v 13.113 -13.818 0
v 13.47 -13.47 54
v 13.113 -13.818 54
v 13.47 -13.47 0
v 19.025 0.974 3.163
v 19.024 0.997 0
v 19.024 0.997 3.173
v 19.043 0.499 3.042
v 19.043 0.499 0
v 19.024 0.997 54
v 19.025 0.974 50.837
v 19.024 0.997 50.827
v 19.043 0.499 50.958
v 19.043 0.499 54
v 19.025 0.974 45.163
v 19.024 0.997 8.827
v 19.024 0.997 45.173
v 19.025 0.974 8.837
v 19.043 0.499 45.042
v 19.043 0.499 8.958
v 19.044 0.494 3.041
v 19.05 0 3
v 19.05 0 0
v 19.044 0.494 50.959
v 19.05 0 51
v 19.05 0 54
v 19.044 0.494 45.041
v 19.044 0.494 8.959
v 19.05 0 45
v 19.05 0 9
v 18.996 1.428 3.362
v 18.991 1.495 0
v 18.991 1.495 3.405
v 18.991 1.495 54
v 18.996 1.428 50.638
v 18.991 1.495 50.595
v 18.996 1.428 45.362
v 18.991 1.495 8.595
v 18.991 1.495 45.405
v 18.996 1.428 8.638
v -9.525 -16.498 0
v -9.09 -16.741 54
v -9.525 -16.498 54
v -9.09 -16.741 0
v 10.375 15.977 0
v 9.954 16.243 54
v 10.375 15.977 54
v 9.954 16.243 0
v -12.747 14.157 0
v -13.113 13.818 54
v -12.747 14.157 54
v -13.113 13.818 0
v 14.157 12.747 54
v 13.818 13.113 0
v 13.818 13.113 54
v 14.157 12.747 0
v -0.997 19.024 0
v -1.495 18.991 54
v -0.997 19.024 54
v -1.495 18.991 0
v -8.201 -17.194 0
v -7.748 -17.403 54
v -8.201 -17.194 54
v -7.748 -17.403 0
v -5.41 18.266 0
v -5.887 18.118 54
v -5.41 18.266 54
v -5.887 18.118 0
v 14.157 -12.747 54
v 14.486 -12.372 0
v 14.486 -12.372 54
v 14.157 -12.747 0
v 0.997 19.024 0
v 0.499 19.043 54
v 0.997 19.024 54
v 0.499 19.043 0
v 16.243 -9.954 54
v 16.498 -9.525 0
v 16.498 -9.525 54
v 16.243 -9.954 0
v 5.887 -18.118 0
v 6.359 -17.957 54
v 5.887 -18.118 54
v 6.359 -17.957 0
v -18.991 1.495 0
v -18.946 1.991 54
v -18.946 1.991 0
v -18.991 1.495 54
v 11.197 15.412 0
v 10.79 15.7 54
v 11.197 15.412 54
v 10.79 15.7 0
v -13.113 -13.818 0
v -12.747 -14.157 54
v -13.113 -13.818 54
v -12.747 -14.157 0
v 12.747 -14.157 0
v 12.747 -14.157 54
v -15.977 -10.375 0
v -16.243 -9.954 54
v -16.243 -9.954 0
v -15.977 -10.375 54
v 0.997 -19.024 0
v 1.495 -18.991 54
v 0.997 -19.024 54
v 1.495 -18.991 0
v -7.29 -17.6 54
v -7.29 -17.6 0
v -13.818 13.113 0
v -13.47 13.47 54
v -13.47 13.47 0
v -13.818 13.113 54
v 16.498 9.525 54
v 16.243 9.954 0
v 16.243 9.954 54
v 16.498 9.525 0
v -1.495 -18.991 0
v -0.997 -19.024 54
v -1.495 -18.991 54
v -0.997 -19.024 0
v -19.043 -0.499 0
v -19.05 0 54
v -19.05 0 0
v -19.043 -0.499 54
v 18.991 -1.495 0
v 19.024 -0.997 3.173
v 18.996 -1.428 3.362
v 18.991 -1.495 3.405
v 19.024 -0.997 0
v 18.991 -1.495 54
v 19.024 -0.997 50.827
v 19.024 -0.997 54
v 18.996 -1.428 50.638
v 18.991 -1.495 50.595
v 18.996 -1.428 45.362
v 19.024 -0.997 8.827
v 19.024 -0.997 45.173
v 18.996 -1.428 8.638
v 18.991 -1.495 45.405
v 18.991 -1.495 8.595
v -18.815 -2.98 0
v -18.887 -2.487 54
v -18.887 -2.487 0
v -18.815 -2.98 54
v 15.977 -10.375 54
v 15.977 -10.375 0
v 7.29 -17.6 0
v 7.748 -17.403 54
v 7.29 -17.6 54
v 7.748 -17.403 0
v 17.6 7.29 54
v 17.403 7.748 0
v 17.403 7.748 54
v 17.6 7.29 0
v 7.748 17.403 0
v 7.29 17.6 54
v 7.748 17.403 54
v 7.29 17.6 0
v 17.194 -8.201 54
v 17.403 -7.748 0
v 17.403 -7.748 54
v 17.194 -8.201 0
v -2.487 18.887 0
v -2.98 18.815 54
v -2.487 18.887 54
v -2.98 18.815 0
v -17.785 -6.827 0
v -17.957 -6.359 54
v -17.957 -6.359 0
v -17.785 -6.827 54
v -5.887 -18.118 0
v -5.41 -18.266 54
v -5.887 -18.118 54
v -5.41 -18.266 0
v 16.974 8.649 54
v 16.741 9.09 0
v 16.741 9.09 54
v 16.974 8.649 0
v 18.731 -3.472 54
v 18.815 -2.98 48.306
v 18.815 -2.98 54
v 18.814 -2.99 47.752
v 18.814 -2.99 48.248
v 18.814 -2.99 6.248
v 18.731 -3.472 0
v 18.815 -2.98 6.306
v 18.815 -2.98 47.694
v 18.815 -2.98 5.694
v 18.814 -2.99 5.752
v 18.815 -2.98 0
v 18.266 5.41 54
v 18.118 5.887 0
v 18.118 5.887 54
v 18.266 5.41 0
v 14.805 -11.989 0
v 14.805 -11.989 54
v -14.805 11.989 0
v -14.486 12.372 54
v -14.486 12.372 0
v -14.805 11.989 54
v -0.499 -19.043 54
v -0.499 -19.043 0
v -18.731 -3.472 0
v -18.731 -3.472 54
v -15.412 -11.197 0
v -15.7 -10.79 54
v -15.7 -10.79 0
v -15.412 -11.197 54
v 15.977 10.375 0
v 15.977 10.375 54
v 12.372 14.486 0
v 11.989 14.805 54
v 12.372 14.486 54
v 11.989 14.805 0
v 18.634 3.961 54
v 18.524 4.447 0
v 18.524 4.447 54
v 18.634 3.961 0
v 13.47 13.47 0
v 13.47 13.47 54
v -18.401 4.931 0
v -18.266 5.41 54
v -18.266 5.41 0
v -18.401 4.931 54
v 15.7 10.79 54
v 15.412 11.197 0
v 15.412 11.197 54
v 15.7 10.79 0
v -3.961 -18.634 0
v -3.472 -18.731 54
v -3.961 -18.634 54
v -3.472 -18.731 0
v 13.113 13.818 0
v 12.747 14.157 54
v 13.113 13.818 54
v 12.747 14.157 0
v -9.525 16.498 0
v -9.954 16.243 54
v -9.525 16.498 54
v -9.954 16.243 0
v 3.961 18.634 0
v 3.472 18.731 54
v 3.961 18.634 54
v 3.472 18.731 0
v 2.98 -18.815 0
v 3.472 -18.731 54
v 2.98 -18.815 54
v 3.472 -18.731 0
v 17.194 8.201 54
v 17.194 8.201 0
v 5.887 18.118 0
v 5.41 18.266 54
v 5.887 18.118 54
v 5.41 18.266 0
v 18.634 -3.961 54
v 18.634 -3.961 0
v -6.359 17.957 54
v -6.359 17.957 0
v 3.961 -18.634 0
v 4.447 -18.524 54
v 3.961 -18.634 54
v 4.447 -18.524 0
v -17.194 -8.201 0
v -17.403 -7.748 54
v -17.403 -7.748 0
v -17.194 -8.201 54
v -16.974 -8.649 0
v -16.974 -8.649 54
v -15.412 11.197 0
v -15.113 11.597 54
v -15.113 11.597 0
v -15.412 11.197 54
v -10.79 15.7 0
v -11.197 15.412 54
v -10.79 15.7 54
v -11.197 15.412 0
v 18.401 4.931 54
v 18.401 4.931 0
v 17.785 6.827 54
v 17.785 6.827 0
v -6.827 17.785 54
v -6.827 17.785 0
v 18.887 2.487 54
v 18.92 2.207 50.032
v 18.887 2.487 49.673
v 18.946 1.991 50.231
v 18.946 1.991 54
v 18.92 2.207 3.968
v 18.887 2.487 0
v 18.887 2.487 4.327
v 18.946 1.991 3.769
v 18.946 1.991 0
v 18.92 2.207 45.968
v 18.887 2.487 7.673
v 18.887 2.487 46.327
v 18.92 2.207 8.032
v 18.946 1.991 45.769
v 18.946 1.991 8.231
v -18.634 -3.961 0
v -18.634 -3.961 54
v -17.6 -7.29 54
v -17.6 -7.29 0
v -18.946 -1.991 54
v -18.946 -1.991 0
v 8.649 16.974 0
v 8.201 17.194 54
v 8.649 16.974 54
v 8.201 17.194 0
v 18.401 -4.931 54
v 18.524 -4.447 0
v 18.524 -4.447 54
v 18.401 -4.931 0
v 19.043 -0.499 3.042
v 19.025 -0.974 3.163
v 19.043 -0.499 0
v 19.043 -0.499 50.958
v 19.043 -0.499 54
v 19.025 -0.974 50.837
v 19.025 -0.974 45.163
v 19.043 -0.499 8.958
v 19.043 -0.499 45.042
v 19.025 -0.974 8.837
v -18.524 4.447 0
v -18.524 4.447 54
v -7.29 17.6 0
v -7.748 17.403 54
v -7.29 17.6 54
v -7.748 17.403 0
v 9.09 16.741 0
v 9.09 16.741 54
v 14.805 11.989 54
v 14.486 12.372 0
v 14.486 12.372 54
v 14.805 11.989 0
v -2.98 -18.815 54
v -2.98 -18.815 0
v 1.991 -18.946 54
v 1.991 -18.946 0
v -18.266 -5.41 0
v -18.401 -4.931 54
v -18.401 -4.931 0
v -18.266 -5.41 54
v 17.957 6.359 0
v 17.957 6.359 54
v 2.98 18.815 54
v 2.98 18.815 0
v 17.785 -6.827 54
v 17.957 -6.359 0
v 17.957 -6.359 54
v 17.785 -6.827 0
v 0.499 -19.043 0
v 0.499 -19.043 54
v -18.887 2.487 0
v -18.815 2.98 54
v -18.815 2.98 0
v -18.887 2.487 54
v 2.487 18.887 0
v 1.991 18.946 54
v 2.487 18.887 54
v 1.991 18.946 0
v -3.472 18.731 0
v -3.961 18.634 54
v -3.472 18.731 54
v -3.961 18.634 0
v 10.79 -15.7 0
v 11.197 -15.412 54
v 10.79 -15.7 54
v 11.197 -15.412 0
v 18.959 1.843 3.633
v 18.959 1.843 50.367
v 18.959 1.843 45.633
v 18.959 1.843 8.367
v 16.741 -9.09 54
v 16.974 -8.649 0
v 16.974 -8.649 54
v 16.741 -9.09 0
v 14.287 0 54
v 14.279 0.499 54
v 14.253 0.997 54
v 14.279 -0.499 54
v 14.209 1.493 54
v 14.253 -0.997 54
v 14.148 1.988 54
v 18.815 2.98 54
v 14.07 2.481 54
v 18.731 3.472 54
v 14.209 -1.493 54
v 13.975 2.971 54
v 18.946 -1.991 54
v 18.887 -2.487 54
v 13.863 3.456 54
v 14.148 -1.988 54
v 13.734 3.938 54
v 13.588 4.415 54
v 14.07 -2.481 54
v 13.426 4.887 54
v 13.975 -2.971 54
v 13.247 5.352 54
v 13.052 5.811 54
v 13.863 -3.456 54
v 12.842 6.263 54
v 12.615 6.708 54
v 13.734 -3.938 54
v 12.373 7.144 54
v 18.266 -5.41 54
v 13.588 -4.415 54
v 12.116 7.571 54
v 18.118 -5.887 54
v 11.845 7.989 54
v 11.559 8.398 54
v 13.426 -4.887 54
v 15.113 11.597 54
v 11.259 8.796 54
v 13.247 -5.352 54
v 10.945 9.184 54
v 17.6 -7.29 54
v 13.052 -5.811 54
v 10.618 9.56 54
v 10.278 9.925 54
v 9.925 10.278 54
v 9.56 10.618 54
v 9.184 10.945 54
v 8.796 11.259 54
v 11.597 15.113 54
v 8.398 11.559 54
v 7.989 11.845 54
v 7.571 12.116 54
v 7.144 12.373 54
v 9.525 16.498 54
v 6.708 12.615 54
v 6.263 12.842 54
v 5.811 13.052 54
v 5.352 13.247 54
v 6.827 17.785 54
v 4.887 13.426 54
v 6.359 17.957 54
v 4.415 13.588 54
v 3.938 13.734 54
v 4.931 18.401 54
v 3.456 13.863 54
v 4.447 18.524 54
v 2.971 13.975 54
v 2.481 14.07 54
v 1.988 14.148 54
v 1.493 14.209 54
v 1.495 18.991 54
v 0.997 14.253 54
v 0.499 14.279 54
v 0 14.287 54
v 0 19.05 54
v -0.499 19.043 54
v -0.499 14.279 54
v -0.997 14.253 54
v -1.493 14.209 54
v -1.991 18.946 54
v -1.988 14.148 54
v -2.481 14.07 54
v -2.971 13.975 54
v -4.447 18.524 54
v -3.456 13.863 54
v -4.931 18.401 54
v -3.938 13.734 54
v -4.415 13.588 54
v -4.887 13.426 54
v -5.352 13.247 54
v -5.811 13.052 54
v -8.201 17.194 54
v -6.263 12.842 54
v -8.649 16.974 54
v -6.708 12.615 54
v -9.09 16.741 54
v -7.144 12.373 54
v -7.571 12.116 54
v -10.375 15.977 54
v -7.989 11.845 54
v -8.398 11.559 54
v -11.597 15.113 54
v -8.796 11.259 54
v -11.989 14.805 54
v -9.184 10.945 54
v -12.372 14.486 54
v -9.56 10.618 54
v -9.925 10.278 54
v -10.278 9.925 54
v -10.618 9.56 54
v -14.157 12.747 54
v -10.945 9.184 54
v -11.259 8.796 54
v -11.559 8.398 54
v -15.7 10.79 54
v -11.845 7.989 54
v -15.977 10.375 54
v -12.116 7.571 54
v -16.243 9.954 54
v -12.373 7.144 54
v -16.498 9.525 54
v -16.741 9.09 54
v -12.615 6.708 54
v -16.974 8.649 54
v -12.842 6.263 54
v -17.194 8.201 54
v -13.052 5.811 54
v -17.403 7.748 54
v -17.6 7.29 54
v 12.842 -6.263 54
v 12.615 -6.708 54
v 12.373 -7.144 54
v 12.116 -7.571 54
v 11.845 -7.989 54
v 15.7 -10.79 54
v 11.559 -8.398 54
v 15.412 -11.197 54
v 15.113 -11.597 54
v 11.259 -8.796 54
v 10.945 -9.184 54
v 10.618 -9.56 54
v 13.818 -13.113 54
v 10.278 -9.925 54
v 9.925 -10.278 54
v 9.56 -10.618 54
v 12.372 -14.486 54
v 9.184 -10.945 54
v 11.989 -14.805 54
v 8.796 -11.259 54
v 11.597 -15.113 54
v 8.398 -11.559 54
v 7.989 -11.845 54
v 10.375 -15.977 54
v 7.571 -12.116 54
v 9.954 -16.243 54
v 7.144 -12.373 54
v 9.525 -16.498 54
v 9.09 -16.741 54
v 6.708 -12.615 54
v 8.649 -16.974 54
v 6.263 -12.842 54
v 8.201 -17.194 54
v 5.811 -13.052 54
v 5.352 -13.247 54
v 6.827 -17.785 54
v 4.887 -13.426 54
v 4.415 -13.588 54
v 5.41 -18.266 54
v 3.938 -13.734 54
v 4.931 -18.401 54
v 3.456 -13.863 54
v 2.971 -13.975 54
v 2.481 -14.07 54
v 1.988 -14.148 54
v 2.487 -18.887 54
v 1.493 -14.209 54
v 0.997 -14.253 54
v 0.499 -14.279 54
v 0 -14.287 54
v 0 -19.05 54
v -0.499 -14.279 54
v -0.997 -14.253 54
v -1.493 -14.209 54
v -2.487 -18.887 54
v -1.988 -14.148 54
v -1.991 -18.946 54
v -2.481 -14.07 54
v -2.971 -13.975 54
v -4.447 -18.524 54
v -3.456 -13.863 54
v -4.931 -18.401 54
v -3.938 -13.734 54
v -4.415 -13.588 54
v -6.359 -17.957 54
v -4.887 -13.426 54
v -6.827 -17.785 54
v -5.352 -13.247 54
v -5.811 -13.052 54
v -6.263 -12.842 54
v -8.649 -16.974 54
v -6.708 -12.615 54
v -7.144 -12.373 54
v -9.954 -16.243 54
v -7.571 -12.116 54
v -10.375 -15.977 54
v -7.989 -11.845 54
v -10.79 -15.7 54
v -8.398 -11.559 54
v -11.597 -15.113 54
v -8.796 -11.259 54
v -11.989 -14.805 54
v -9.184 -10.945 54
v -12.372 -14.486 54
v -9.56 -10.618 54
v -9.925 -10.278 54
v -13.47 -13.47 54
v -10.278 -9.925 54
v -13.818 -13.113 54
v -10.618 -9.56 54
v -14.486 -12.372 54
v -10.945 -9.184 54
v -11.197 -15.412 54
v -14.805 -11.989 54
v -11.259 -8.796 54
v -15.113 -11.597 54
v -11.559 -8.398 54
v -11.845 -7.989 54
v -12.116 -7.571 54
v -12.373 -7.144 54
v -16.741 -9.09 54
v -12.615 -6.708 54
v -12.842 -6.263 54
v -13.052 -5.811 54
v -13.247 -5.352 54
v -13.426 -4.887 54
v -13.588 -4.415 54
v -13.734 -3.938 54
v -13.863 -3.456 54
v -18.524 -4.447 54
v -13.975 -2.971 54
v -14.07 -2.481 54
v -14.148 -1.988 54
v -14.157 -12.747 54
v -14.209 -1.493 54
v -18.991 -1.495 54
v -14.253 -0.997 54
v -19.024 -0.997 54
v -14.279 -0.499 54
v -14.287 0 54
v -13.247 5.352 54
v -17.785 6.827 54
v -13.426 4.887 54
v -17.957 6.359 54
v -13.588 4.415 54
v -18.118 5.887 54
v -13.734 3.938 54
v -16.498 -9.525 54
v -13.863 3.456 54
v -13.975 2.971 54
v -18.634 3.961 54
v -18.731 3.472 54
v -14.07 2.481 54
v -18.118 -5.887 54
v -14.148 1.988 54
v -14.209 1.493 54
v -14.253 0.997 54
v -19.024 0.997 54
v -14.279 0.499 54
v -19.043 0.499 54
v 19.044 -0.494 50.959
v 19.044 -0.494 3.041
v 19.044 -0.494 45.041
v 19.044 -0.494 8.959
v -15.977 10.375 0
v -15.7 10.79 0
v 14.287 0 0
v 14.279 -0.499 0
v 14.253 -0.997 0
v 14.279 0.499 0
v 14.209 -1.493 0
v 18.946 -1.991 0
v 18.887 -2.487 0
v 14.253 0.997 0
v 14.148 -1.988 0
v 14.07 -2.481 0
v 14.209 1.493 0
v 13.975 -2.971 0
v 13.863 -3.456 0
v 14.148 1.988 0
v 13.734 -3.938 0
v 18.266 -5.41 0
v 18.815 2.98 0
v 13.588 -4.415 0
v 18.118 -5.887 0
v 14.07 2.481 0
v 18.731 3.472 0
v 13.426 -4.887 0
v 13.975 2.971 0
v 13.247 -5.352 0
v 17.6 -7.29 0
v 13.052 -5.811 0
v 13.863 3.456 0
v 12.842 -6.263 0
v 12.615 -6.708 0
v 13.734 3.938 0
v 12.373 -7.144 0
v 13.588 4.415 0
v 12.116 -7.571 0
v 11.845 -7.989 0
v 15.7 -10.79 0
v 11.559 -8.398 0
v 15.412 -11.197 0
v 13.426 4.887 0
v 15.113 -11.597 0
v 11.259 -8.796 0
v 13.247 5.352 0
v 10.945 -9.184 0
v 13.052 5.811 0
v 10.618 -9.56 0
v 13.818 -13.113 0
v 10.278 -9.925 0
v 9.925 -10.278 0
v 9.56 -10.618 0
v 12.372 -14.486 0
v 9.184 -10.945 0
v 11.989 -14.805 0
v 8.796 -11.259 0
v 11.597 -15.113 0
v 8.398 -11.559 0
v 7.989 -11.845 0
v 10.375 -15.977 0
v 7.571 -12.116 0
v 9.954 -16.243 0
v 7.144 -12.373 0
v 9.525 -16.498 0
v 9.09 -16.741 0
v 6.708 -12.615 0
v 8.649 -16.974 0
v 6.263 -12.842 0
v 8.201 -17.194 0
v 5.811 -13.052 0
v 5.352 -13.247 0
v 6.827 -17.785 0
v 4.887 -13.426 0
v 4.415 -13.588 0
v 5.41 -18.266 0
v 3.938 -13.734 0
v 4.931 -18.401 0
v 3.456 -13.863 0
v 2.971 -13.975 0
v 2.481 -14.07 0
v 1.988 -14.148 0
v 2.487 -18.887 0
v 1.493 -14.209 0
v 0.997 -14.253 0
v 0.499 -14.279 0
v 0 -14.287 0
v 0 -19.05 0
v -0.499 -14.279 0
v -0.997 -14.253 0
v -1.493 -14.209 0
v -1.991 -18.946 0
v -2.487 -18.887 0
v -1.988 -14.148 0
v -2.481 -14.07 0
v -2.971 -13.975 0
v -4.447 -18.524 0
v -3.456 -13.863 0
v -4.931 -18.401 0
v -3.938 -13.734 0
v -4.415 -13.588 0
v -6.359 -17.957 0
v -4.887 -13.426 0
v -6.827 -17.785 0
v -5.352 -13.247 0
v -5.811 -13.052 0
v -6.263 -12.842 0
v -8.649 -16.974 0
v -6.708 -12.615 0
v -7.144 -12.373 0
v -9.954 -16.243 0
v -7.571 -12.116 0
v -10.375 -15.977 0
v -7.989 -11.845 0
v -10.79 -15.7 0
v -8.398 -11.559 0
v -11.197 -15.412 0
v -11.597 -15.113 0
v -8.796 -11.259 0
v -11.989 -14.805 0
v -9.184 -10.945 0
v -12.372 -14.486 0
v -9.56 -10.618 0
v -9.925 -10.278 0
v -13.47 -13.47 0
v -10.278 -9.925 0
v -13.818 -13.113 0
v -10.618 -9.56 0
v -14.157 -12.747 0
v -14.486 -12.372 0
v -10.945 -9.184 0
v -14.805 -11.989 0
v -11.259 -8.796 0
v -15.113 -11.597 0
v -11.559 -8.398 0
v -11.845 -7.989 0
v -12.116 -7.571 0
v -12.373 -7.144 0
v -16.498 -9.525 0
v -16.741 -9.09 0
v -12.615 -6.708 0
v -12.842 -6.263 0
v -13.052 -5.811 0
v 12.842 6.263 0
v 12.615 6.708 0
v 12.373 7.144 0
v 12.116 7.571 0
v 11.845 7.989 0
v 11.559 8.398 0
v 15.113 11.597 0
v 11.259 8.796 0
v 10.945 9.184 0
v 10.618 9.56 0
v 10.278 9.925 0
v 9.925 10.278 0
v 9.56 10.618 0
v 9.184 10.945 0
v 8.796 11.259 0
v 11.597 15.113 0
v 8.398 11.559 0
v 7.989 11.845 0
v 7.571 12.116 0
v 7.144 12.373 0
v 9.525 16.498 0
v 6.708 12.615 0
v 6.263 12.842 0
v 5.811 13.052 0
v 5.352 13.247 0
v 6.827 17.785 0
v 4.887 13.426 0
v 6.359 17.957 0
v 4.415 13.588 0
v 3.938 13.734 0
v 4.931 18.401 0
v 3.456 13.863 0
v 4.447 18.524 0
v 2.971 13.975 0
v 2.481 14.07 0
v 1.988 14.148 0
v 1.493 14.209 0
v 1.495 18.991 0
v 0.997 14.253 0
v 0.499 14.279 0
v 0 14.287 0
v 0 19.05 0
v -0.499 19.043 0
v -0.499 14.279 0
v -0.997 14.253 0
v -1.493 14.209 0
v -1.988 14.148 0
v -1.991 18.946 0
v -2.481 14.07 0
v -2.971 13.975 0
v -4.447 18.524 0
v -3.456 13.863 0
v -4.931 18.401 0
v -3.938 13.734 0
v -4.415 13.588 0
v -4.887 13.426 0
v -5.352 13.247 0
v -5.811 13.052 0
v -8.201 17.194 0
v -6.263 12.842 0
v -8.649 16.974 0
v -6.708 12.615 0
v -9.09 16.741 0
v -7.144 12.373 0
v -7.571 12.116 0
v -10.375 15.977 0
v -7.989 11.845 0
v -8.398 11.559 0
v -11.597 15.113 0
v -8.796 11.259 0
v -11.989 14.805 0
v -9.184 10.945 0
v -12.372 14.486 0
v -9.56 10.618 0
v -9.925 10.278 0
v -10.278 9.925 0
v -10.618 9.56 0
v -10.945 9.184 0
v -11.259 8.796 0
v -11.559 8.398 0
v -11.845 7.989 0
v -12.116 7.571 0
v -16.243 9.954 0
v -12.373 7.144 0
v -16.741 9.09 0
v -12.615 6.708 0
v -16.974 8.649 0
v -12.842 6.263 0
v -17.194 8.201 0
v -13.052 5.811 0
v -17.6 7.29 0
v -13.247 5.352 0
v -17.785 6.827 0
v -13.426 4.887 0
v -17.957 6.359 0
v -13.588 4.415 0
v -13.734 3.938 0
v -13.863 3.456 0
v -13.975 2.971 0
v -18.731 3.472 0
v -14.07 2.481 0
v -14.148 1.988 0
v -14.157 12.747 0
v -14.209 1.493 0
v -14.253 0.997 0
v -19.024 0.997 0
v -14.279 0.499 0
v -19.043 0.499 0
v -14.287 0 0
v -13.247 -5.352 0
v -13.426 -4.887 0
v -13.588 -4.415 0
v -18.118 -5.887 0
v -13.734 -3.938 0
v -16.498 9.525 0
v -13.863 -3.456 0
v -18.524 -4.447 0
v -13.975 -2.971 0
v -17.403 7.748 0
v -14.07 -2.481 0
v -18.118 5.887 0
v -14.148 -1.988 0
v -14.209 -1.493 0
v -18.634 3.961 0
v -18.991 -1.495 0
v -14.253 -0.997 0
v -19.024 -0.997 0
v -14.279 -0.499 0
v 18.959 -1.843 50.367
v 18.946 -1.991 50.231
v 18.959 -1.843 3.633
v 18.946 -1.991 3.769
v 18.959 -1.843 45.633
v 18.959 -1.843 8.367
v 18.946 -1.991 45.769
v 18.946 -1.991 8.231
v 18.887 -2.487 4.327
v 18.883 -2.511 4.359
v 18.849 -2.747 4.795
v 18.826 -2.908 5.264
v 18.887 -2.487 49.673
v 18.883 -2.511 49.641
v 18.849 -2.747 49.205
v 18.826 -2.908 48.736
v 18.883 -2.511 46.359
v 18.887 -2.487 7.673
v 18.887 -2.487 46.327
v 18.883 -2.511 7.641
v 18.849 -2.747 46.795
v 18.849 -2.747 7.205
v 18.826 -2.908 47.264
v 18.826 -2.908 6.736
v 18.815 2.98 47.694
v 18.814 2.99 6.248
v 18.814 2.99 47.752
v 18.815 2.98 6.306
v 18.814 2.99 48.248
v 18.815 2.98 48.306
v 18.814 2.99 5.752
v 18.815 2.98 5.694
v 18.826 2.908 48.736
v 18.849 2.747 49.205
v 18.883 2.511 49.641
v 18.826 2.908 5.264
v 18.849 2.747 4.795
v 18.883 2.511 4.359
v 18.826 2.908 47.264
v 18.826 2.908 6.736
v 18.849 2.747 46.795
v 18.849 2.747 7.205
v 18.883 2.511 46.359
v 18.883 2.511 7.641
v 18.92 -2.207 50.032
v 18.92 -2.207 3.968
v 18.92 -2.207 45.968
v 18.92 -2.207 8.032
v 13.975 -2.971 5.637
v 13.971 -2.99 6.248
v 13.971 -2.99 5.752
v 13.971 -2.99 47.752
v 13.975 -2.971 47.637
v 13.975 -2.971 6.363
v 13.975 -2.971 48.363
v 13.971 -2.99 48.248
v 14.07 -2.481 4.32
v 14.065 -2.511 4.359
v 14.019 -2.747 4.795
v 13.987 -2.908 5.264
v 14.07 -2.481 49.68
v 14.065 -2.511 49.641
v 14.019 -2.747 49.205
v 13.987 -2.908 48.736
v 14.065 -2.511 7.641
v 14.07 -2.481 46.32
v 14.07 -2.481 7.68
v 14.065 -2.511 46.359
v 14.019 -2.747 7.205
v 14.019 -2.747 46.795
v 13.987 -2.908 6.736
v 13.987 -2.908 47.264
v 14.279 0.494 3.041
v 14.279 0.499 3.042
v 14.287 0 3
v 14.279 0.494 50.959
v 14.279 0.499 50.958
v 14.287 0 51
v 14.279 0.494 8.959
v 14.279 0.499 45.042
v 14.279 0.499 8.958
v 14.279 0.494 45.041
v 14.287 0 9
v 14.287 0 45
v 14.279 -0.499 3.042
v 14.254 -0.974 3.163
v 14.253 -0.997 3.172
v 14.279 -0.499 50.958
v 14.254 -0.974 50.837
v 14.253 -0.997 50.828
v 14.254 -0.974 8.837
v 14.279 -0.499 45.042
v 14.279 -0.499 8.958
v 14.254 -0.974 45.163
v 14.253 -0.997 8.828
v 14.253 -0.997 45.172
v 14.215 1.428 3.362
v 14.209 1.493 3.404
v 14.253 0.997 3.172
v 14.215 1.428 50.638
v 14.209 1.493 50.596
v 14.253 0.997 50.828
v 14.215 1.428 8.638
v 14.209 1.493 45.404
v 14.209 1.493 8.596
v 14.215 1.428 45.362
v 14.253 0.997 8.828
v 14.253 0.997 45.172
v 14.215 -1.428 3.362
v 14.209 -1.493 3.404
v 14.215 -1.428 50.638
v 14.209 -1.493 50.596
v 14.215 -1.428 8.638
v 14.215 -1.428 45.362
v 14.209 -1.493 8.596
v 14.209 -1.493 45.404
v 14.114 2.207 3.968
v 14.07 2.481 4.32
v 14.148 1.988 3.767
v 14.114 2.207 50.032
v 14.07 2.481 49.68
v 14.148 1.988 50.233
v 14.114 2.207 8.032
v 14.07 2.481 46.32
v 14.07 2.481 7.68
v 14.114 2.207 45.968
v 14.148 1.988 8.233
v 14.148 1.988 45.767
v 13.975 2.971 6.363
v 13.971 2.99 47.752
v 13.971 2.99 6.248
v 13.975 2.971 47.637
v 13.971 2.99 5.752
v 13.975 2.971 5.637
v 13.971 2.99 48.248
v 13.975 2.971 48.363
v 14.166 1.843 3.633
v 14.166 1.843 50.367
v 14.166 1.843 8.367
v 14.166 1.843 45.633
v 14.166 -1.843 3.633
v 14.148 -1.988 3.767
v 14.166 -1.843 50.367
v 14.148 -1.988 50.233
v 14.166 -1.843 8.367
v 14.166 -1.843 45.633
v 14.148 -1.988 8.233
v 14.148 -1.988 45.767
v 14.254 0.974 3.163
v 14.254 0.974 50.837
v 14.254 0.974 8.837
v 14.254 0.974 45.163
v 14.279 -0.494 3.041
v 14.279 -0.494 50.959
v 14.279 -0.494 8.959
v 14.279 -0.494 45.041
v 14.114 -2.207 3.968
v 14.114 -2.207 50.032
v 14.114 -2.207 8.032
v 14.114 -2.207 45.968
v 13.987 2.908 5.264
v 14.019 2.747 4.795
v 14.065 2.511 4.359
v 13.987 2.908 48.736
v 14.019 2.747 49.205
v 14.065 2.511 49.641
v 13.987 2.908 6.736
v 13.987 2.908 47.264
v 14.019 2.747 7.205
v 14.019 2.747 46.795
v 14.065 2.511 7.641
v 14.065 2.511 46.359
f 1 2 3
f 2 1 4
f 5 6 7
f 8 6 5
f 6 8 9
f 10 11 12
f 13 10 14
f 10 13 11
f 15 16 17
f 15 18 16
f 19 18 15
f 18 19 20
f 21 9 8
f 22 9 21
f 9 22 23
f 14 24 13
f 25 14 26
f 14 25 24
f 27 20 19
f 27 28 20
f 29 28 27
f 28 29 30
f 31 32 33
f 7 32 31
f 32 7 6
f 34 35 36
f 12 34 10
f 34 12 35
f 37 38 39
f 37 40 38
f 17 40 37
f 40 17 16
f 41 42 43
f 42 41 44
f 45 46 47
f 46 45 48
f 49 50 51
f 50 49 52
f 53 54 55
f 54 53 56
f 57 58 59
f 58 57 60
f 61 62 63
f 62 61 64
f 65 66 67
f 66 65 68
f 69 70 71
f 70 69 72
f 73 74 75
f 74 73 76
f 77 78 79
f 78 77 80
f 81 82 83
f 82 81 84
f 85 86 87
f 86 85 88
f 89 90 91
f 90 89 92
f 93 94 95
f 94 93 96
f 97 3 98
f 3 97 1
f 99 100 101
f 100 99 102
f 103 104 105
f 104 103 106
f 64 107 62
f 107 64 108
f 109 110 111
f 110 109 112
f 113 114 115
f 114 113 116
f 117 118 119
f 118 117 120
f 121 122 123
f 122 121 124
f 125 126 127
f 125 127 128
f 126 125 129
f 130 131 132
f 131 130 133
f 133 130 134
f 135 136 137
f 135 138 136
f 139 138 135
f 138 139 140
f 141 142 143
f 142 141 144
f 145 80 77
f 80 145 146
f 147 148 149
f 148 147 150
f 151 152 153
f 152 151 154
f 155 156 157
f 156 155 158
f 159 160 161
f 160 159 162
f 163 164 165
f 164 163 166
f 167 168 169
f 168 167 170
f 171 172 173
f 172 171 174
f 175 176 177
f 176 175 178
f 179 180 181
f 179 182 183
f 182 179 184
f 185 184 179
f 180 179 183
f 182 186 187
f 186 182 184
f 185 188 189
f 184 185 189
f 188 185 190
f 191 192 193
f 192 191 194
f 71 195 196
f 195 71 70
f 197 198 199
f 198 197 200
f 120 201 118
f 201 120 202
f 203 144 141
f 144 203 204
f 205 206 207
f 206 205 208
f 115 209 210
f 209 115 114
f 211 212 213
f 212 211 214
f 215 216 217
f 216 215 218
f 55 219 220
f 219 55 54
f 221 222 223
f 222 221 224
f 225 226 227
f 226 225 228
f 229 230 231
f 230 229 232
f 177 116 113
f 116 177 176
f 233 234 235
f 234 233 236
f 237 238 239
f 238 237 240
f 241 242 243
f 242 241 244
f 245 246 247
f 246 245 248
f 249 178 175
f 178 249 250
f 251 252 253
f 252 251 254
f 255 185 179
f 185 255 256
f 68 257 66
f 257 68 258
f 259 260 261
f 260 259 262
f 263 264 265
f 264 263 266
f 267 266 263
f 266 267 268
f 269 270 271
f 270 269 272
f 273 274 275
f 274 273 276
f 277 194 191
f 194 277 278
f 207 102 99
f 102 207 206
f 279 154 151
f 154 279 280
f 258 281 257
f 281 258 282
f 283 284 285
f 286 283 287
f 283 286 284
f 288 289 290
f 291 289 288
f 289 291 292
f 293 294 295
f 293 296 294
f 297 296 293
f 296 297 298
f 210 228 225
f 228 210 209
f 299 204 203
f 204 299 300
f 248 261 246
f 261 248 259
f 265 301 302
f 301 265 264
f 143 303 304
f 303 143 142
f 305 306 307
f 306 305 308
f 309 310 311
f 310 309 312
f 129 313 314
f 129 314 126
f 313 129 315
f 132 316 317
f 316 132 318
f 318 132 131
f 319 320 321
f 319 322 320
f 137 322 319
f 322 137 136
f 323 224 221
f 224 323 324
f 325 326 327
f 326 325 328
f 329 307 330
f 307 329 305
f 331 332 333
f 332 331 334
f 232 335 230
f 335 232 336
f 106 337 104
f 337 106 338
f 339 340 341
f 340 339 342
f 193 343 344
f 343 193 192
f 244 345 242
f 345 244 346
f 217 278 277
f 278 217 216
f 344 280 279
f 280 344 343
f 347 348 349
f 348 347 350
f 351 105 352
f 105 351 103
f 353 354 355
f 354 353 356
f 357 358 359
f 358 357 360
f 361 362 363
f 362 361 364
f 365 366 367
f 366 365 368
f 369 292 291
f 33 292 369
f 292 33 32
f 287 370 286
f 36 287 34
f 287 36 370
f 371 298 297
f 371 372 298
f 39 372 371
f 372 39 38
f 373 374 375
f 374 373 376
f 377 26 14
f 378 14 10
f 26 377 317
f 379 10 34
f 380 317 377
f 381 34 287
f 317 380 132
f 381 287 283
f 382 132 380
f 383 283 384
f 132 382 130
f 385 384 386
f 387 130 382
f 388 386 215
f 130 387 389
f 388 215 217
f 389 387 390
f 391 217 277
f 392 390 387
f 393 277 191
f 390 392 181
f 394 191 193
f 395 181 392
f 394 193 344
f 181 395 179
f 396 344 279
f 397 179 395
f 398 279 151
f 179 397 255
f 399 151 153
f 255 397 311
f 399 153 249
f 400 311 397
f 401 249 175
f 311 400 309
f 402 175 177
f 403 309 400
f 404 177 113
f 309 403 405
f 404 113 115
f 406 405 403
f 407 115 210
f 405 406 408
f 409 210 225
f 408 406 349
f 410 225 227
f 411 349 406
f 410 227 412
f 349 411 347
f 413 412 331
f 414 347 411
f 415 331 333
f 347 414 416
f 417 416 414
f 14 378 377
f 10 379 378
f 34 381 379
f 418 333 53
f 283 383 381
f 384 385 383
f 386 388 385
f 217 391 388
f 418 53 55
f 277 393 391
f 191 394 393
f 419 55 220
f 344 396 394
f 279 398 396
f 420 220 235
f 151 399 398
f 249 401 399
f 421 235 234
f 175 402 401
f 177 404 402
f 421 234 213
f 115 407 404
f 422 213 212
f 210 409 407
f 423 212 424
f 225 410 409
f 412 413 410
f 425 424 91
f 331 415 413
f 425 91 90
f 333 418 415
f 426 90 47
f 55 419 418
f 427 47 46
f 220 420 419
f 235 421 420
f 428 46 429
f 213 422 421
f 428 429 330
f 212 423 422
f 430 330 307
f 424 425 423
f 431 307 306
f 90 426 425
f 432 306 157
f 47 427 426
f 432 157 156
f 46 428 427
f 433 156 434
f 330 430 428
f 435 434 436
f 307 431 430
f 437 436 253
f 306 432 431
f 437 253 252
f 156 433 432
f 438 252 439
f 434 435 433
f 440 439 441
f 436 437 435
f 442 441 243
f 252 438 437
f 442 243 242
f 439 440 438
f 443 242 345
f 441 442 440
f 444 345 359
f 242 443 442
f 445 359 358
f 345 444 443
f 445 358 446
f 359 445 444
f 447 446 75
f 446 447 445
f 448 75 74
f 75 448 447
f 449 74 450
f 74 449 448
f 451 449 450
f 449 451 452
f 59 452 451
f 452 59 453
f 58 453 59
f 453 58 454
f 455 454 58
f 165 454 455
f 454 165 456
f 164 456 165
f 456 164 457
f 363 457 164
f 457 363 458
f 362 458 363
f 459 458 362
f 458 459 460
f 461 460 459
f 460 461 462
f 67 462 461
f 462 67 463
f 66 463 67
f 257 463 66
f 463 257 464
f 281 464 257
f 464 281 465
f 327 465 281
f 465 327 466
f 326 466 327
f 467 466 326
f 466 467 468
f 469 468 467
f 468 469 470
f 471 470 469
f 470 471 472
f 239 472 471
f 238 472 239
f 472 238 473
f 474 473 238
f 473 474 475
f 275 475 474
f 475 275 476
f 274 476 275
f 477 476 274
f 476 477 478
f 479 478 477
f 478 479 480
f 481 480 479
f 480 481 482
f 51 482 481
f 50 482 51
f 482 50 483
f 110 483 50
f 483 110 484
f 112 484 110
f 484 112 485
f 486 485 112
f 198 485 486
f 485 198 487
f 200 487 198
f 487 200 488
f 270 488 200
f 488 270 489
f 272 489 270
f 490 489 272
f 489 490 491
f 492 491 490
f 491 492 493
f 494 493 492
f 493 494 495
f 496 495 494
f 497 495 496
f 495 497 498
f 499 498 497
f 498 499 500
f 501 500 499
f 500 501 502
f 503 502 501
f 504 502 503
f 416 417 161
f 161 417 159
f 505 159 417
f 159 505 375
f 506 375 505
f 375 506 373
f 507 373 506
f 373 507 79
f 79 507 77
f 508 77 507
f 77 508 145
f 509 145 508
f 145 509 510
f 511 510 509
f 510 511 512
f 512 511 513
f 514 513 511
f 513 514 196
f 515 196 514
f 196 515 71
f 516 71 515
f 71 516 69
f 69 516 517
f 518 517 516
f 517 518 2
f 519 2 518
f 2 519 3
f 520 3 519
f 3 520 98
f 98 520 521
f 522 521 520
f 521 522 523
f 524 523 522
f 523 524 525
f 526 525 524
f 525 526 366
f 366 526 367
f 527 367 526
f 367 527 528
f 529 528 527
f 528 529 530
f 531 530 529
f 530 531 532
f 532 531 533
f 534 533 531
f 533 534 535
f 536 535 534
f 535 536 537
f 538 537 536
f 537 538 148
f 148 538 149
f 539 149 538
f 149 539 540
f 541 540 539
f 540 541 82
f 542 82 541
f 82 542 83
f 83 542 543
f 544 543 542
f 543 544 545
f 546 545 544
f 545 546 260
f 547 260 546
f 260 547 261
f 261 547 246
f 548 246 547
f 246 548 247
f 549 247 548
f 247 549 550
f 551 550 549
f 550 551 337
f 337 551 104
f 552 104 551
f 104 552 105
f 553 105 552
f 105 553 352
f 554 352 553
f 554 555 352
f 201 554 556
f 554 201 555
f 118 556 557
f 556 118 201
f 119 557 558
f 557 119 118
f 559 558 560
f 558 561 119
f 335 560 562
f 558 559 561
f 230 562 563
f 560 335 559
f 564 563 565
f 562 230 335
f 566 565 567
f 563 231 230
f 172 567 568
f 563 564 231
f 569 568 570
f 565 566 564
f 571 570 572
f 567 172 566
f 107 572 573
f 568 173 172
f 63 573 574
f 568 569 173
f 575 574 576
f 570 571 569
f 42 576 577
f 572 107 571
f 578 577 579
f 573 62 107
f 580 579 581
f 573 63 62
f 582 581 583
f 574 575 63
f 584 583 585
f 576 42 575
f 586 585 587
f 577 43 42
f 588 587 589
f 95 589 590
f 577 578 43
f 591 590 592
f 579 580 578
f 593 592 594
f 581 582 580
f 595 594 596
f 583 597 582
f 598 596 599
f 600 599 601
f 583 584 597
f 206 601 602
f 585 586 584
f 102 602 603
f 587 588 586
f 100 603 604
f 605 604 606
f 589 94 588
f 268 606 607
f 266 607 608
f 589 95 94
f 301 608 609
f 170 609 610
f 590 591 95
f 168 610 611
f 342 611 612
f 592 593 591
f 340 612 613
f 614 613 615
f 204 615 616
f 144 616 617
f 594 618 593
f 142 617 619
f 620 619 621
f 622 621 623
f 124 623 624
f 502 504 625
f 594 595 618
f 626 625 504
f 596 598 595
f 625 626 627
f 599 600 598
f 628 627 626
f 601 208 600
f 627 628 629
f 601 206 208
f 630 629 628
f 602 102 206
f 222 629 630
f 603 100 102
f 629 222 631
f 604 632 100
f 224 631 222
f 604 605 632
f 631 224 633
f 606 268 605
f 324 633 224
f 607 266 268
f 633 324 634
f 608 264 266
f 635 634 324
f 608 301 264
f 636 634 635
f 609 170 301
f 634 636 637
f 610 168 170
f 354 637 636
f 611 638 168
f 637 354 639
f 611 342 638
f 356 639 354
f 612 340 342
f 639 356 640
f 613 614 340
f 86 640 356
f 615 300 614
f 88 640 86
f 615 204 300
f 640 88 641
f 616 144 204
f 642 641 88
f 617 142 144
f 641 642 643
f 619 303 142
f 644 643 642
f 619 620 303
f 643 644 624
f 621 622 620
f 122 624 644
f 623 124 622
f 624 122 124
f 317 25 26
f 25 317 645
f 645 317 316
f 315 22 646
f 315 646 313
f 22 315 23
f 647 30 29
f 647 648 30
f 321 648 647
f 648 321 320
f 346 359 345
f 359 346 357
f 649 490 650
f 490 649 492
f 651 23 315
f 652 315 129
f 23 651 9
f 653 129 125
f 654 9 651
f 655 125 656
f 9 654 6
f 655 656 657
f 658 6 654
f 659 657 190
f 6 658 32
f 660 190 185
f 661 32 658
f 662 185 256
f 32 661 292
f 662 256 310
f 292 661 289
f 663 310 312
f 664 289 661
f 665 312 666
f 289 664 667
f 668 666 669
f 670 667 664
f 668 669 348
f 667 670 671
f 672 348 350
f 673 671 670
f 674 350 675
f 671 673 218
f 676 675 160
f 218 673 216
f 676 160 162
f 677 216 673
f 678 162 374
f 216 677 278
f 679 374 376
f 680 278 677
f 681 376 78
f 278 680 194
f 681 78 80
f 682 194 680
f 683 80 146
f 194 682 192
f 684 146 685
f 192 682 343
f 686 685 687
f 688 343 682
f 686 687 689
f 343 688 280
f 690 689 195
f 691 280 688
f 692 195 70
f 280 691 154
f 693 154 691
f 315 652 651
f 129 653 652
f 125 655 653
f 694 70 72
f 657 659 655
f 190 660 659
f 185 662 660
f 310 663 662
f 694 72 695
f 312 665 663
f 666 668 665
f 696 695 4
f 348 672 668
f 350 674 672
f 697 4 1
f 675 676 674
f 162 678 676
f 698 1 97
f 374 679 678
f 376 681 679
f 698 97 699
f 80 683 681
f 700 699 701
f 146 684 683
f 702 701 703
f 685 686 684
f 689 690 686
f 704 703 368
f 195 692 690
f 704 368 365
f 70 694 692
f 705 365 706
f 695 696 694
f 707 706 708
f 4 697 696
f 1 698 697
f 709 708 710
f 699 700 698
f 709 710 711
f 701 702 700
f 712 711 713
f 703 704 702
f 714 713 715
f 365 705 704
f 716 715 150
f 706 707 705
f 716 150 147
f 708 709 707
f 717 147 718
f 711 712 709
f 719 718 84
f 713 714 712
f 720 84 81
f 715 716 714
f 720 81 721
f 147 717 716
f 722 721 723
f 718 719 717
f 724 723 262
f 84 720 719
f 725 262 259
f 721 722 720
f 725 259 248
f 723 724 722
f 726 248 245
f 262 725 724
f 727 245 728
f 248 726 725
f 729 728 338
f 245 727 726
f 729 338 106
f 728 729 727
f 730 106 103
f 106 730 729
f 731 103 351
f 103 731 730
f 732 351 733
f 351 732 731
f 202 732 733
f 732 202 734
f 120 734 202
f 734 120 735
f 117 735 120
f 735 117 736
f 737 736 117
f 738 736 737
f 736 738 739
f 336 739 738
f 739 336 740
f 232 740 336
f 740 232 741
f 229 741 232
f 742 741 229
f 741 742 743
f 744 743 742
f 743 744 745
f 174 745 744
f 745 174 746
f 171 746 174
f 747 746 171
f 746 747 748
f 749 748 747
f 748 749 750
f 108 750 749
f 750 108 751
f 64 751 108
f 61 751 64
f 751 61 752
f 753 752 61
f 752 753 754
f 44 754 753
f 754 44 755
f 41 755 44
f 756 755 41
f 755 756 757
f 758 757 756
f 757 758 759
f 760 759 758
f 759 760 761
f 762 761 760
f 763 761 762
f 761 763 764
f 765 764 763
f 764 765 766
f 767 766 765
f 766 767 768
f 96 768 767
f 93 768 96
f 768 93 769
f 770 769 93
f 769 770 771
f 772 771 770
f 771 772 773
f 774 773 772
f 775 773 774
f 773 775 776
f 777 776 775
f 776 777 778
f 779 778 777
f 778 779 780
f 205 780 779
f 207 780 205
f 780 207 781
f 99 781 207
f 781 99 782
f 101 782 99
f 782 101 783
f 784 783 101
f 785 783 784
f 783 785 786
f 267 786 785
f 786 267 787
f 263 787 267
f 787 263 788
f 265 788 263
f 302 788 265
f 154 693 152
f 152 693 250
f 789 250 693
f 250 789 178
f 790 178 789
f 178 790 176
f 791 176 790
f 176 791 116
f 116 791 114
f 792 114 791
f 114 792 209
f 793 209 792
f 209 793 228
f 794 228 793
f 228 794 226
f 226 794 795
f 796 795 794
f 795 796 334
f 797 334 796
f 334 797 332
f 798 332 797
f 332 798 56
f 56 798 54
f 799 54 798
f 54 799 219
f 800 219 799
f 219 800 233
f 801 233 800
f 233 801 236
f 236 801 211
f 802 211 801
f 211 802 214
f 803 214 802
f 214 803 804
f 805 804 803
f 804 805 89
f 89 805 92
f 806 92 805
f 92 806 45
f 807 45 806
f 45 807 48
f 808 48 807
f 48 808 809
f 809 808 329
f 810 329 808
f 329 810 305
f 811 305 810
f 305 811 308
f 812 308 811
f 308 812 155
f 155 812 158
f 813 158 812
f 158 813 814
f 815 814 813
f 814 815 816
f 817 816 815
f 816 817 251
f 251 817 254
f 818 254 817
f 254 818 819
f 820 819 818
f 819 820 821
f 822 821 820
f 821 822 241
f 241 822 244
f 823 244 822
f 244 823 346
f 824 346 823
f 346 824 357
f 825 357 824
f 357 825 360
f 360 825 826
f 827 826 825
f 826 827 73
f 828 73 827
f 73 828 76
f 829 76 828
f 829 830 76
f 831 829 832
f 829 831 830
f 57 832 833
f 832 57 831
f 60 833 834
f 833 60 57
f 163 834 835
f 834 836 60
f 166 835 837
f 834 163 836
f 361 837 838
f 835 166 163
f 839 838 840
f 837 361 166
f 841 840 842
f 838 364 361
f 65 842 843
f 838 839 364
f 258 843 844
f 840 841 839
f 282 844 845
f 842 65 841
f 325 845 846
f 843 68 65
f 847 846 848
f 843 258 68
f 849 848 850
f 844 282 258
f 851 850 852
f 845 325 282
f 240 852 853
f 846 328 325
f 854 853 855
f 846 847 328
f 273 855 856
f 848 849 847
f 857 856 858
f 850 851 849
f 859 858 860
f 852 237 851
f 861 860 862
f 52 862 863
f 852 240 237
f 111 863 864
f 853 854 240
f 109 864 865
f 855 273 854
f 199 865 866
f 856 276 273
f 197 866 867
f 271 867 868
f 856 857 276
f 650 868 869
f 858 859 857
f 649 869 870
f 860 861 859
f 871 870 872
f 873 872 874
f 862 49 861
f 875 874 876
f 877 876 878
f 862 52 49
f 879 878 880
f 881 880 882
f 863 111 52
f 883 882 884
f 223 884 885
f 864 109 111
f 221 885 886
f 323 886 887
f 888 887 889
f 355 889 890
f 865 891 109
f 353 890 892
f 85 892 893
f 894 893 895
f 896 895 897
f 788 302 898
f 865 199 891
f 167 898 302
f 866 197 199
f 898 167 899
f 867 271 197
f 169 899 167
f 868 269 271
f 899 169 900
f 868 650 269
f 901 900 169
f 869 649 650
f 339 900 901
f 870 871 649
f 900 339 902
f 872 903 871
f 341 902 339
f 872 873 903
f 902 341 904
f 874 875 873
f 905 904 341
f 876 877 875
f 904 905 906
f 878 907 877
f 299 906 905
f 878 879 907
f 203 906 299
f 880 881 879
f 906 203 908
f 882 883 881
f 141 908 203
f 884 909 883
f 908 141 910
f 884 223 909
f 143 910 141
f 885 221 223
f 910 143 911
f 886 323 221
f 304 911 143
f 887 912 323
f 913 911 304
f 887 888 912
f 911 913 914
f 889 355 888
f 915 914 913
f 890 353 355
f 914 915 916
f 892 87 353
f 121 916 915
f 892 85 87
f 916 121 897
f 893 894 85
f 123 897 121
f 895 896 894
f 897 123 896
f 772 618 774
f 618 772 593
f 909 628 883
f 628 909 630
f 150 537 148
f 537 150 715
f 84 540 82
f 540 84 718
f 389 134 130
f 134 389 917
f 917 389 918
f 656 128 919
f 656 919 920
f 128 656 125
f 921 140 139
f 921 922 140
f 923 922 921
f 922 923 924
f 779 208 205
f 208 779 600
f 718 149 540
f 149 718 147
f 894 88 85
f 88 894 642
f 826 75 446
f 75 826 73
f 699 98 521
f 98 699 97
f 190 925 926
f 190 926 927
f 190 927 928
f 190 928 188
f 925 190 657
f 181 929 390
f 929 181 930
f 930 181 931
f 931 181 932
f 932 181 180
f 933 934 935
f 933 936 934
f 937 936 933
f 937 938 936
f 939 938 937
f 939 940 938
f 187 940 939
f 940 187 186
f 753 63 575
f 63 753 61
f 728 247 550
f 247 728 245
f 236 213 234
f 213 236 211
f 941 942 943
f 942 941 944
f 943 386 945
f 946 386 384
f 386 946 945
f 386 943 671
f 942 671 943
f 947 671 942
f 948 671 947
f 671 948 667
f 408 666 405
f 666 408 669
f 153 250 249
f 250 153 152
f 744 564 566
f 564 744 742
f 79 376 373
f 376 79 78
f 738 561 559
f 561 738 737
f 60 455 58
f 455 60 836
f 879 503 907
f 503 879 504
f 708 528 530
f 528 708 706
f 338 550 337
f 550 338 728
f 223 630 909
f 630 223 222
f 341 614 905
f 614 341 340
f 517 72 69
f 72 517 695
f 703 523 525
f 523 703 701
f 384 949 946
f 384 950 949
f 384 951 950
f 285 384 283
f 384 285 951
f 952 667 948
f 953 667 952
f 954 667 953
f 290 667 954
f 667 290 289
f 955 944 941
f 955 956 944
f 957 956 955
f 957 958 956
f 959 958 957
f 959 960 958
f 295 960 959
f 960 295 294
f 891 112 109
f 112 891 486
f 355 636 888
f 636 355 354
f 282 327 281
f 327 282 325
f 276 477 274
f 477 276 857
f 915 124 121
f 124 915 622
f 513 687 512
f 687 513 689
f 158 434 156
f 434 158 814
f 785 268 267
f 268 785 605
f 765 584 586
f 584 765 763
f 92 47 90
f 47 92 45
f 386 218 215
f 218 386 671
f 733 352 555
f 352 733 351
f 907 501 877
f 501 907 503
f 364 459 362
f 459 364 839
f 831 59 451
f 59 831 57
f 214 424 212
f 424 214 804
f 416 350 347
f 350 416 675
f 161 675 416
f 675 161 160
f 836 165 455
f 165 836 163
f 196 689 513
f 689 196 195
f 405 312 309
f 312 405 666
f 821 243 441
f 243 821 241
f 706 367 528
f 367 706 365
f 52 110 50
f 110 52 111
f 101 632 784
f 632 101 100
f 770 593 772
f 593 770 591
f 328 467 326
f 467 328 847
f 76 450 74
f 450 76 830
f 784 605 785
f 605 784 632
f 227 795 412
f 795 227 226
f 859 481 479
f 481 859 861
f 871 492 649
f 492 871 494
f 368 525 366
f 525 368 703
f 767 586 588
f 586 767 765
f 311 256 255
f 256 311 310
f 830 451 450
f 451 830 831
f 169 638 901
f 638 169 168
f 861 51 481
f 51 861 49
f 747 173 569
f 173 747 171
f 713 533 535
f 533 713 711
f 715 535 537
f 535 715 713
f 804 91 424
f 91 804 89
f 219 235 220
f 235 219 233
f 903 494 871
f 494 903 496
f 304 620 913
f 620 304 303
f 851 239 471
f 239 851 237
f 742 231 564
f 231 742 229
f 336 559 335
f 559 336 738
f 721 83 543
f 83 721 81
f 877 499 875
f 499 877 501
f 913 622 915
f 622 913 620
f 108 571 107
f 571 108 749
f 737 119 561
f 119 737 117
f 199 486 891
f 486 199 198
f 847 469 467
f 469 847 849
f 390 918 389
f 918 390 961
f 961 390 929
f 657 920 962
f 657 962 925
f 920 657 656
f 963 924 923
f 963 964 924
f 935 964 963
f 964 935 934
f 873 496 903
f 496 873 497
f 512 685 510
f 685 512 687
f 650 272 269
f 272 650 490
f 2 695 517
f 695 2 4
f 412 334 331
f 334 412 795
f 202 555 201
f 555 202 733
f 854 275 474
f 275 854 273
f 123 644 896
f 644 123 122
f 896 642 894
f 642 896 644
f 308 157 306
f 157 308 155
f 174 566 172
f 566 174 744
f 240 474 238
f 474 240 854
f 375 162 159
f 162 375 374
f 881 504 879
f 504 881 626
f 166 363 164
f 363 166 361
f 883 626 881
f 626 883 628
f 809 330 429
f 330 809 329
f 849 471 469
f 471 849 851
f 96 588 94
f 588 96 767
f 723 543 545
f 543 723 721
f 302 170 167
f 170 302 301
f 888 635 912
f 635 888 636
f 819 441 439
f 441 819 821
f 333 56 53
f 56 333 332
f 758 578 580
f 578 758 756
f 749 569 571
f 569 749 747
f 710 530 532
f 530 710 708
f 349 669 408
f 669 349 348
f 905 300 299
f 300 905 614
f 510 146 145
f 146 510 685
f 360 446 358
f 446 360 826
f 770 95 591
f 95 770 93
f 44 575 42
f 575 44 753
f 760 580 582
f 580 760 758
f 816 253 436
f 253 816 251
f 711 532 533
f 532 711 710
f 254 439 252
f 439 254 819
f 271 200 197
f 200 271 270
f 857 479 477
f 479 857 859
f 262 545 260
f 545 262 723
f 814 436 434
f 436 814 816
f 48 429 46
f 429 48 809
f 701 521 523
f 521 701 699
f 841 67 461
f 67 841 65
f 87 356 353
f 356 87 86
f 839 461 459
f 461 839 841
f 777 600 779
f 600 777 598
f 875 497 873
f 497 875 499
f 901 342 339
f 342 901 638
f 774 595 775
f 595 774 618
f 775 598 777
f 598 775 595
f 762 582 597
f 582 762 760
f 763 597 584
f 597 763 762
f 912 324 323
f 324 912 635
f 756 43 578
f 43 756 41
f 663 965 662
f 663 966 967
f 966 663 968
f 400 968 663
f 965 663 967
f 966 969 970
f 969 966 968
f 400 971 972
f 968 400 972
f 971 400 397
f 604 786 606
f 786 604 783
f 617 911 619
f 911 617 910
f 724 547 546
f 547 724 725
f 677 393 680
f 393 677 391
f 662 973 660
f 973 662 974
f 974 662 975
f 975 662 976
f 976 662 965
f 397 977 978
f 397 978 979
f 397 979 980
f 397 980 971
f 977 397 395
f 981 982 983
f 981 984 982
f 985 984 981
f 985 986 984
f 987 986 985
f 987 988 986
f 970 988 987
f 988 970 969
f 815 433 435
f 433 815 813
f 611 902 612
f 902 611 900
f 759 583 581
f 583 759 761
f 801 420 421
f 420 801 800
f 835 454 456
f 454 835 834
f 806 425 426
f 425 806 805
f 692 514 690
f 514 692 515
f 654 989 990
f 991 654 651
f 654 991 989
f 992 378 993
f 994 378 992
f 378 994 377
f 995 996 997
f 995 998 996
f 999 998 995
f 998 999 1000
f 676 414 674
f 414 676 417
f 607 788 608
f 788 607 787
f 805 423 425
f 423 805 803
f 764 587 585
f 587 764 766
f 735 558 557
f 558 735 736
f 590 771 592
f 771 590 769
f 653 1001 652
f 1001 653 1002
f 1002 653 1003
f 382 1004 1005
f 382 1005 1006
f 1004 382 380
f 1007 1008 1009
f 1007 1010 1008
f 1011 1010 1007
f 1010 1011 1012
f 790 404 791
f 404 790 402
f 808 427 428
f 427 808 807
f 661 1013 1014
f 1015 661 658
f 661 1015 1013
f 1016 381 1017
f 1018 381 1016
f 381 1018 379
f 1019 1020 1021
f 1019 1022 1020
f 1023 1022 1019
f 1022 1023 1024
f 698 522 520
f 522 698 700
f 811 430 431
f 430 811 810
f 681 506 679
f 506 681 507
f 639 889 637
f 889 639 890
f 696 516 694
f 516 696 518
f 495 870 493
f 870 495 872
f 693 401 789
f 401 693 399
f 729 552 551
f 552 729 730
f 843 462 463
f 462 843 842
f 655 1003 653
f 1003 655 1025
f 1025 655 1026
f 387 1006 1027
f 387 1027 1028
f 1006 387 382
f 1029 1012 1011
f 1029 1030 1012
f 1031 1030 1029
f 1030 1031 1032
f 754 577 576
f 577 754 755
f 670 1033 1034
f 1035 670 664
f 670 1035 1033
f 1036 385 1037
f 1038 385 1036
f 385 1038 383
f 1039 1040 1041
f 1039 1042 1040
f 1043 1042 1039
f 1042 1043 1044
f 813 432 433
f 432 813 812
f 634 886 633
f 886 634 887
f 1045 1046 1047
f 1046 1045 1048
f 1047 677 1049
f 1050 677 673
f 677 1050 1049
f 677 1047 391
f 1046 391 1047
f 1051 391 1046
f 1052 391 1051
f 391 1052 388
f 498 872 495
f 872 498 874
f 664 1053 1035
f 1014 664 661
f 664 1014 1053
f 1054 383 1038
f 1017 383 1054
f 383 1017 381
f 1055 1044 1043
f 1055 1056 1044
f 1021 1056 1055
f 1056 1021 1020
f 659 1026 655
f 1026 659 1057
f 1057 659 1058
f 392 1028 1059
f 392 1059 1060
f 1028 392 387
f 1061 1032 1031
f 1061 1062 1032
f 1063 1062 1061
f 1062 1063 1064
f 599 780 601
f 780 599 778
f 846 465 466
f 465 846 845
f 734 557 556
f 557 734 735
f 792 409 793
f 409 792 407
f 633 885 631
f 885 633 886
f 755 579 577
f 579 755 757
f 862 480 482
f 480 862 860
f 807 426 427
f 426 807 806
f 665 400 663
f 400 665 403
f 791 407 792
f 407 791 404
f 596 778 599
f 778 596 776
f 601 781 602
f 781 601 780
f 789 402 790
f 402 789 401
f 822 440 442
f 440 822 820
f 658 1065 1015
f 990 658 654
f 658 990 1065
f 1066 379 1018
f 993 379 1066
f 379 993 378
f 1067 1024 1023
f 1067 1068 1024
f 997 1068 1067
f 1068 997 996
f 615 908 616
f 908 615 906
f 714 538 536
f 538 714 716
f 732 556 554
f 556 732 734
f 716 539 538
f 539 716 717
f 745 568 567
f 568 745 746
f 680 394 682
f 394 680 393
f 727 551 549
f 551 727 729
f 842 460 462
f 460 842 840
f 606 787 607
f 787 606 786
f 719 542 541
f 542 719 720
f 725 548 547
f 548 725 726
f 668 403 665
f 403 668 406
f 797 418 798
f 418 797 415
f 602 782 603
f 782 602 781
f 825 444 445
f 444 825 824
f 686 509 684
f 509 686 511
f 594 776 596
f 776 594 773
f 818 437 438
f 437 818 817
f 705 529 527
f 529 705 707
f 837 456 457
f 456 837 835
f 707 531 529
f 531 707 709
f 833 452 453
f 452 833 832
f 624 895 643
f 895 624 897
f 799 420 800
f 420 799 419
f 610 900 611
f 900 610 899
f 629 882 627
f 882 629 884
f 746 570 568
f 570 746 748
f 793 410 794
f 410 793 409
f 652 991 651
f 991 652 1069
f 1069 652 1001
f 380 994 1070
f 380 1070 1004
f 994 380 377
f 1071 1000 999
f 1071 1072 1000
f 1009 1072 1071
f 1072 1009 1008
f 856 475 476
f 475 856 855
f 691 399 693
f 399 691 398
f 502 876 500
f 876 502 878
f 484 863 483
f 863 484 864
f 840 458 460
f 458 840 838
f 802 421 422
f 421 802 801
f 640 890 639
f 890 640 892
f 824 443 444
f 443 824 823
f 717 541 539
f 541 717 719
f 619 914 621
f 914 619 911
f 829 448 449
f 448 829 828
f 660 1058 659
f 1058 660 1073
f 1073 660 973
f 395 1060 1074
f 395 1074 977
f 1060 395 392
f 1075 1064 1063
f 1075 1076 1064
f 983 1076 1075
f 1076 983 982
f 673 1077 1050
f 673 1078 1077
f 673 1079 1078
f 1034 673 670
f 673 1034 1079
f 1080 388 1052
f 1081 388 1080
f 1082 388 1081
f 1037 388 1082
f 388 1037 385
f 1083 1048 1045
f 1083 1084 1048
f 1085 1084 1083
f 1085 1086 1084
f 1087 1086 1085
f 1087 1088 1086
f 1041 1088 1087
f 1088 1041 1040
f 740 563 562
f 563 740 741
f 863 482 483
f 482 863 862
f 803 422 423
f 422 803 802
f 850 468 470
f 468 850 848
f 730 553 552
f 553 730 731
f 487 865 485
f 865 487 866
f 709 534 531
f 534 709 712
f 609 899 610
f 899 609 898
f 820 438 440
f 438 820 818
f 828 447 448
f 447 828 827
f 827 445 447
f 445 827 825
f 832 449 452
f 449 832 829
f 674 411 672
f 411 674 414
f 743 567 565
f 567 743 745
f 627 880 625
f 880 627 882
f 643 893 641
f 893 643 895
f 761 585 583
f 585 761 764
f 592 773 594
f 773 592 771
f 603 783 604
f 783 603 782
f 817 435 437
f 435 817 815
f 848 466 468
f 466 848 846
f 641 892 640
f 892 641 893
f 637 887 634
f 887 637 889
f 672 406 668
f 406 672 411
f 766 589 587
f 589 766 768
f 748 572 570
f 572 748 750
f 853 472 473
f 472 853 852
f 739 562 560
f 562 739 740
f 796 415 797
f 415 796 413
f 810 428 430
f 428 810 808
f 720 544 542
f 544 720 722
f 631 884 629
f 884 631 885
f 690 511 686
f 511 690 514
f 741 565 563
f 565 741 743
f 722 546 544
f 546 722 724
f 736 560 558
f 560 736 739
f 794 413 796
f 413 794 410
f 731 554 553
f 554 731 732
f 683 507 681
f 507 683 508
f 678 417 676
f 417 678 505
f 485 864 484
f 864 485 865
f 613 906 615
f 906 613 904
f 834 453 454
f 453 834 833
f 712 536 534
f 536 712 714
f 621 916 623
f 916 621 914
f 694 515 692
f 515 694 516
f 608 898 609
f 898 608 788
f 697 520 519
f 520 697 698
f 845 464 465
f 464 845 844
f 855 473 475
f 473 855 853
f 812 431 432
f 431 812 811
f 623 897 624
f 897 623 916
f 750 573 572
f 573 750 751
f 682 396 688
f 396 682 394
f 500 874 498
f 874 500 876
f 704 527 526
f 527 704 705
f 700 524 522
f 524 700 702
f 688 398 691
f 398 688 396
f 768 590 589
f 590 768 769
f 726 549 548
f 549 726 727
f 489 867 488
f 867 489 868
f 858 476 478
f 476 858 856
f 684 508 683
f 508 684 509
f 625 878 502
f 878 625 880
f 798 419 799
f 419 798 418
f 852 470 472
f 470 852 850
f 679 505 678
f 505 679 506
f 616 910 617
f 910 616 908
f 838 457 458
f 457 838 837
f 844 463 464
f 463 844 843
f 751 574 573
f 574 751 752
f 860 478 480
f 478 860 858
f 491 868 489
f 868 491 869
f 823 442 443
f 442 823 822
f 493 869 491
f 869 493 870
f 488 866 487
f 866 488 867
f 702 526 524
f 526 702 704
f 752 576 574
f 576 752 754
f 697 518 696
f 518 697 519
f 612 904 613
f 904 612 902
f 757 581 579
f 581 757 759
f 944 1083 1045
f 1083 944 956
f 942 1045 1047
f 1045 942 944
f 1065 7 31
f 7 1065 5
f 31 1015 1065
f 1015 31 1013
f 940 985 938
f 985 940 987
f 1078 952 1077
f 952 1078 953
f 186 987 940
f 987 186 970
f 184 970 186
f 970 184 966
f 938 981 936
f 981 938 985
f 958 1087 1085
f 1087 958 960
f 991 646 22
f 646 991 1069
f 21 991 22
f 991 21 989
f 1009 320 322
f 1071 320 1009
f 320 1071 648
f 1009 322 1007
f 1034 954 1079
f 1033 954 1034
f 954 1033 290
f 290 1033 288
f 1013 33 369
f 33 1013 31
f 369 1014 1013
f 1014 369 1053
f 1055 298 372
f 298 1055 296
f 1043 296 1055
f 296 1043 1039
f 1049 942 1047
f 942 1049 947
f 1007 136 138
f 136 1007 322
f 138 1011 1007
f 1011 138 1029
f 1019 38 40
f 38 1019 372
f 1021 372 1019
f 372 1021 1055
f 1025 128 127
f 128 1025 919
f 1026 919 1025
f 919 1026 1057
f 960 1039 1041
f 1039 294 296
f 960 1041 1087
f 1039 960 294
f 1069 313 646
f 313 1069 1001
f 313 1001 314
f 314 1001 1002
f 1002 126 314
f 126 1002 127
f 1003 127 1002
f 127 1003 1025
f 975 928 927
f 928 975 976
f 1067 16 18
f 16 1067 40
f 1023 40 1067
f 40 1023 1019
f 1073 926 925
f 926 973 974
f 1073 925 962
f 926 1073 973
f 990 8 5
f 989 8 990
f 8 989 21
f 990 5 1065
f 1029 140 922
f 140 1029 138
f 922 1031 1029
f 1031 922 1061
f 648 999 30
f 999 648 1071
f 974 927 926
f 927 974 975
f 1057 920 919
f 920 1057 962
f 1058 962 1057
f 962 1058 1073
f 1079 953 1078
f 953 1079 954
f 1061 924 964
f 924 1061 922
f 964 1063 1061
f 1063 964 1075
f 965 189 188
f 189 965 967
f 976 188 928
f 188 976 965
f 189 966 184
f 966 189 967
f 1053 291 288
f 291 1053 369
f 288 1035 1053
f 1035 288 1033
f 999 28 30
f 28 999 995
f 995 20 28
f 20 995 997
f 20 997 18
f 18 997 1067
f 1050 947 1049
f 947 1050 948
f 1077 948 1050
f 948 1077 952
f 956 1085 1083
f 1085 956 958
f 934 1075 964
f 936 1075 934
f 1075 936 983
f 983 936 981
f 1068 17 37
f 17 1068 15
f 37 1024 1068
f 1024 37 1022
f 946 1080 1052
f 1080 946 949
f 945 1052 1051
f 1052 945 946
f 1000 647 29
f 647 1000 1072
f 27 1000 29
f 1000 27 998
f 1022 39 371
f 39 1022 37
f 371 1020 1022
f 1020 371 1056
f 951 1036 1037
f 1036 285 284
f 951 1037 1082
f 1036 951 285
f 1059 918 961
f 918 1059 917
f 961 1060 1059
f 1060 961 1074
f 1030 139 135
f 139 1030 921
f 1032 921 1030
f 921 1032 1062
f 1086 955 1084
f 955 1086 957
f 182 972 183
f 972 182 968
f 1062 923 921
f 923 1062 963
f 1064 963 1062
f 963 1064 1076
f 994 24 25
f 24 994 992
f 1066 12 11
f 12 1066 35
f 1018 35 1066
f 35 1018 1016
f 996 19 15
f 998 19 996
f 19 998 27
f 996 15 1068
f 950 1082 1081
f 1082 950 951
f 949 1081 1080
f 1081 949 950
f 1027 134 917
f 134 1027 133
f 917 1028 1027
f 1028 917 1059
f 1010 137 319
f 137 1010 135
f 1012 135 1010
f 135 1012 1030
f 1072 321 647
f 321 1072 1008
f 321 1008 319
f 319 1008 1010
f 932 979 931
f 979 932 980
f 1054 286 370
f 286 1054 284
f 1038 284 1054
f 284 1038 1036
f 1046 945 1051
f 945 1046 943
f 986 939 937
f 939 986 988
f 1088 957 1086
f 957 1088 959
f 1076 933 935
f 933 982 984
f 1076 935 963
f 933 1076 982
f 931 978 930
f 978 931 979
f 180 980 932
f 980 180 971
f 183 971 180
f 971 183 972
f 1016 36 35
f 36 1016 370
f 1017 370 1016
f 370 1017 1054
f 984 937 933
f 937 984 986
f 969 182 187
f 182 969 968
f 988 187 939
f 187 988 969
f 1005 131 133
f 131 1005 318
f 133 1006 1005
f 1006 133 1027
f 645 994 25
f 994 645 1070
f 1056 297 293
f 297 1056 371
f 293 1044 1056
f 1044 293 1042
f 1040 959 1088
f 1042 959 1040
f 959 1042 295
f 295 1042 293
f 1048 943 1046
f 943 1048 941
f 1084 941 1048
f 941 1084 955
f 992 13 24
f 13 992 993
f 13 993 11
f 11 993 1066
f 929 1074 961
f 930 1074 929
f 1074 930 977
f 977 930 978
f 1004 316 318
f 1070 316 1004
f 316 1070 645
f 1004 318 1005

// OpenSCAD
$diameter = 38.1;
$num_turns = 8;
$coax_diameter = 6;

module coax_trap_former() {    
    $height = ($num_turns + 1) * $coax_diameter;
    $wall_thickness = $diameter / 8;

    $radius = $diameter / 2;
    $inner_radius = $radius - $wall_thickness;
    
    module coax_hole() {
        $coax_radius = $coax_diameter / 2;
        rotate([0, 90, 0])
        cylinder(1.1 * $diameter, $coax_radius, $coax_radius, false, 
                 $fa = 0.5, $fs = 0.5);
    }
    
    difference() {
        cylinder($height, $radius, $radius, false, 
                 $fa = 0.5, $fs = 0.5);
    
        cylinder($height * 2.1, $inner_radius, $inner_radius, 
                 true, $fa = 0.5, $fs = 0.5);
        
        translate([0, 0, $coax_diameter])
        coax_hole();
        
        translate([0, 0, $height - $coax_diameter])
        coax_hole();
    }
}

coax_trap_former();
